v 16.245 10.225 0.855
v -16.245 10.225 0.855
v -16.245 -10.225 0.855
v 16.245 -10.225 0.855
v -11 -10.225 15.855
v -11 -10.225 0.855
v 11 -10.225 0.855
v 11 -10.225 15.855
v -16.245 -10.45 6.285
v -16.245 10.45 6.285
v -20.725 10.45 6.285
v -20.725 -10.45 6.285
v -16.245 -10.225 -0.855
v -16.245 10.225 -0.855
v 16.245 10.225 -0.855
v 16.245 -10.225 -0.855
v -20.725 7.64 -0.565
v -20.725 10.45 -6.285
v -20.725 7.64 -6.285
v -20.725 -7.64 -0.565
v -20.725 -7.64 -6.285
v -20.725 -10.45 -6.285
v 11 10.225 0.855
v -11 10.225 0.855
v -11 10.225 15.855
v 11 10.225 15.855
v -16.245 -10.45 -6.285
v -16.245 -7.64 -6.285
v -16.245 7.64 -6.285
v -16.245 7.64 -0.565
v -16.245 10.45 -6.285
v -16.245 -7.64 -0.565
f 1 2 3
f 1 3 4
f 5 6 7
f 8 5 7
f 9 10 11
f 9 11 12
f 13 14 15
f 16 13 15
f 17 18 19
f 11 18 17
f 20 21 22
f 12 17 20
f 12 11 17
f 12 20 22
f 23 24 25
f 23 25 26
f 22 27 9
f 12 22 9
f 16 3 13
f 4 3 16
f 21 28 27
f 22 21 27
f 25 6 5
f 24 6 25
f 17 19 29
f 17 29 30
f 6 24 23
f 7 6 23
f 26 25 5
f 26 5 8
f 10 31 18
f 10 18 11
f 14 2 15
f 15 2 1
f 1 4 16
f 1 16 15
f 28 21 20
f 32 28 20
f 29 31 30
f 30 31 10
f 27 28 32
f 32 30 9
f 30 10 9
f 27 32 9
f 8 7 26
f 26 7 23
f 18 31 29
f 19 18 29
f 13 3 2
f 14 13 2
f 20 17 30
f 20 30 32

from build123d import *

# Parameters (mm, degrees)
F0_W     = 32.49
F0_H     = 20.45
F1_DEPTH = 0.855
F2_W     = 20.9
F2_H     = 12.57
F3_DEPTH = 4.48
F4_W     = 15.28
F4_H     = 5.72
F5_DEPTH = 4.48
F6_W     = 22
F6_H     = 20.45
F7_DEPTH = 15


with BuildPart() as f1:
    # F0 (on Top) → F1 (new body, symmetric)
    with BuildSketch(Plane.XY):
        Rectangle(F0_W, F0_H)
    extrude(amount=F1_DEPTH, both=True)


with BuildPart() as f3:
    # F2 (on face) → F3 (new body)
    with BuildSketch(Plane(origin=(-16.245, 0, 0), x_dir=(0, -1, 0), z_dir=(-1, 0, 0))):
        Rectangle(F2_W, F2_H)
    extrude(amount=F3_DEPTH)

    # F4 (on face) → F5 (cut, through all)
    with BuildSketch(Plane(origin=(-20.725, 0, 0), x_dir=(0, -1, 0), z_dir=(-1, 0, 0))):
        with Locations((0, -3.425)):
            Rectangle(F4_W, F4_H)
    extrude(amount=-F5_DEPTH, mode=Mode.SUBTRACT)


with BuildPart() as f7:
    # F6 (on face) → F7 (new body)
    with BuildSketch(Plane.XY.offset(0.855)):
        Rectangle(F6_W, F6_H)
    extrude(amount=F7_DEPTH)


solid = Compound([f1.part, f3.part, f7.part])
